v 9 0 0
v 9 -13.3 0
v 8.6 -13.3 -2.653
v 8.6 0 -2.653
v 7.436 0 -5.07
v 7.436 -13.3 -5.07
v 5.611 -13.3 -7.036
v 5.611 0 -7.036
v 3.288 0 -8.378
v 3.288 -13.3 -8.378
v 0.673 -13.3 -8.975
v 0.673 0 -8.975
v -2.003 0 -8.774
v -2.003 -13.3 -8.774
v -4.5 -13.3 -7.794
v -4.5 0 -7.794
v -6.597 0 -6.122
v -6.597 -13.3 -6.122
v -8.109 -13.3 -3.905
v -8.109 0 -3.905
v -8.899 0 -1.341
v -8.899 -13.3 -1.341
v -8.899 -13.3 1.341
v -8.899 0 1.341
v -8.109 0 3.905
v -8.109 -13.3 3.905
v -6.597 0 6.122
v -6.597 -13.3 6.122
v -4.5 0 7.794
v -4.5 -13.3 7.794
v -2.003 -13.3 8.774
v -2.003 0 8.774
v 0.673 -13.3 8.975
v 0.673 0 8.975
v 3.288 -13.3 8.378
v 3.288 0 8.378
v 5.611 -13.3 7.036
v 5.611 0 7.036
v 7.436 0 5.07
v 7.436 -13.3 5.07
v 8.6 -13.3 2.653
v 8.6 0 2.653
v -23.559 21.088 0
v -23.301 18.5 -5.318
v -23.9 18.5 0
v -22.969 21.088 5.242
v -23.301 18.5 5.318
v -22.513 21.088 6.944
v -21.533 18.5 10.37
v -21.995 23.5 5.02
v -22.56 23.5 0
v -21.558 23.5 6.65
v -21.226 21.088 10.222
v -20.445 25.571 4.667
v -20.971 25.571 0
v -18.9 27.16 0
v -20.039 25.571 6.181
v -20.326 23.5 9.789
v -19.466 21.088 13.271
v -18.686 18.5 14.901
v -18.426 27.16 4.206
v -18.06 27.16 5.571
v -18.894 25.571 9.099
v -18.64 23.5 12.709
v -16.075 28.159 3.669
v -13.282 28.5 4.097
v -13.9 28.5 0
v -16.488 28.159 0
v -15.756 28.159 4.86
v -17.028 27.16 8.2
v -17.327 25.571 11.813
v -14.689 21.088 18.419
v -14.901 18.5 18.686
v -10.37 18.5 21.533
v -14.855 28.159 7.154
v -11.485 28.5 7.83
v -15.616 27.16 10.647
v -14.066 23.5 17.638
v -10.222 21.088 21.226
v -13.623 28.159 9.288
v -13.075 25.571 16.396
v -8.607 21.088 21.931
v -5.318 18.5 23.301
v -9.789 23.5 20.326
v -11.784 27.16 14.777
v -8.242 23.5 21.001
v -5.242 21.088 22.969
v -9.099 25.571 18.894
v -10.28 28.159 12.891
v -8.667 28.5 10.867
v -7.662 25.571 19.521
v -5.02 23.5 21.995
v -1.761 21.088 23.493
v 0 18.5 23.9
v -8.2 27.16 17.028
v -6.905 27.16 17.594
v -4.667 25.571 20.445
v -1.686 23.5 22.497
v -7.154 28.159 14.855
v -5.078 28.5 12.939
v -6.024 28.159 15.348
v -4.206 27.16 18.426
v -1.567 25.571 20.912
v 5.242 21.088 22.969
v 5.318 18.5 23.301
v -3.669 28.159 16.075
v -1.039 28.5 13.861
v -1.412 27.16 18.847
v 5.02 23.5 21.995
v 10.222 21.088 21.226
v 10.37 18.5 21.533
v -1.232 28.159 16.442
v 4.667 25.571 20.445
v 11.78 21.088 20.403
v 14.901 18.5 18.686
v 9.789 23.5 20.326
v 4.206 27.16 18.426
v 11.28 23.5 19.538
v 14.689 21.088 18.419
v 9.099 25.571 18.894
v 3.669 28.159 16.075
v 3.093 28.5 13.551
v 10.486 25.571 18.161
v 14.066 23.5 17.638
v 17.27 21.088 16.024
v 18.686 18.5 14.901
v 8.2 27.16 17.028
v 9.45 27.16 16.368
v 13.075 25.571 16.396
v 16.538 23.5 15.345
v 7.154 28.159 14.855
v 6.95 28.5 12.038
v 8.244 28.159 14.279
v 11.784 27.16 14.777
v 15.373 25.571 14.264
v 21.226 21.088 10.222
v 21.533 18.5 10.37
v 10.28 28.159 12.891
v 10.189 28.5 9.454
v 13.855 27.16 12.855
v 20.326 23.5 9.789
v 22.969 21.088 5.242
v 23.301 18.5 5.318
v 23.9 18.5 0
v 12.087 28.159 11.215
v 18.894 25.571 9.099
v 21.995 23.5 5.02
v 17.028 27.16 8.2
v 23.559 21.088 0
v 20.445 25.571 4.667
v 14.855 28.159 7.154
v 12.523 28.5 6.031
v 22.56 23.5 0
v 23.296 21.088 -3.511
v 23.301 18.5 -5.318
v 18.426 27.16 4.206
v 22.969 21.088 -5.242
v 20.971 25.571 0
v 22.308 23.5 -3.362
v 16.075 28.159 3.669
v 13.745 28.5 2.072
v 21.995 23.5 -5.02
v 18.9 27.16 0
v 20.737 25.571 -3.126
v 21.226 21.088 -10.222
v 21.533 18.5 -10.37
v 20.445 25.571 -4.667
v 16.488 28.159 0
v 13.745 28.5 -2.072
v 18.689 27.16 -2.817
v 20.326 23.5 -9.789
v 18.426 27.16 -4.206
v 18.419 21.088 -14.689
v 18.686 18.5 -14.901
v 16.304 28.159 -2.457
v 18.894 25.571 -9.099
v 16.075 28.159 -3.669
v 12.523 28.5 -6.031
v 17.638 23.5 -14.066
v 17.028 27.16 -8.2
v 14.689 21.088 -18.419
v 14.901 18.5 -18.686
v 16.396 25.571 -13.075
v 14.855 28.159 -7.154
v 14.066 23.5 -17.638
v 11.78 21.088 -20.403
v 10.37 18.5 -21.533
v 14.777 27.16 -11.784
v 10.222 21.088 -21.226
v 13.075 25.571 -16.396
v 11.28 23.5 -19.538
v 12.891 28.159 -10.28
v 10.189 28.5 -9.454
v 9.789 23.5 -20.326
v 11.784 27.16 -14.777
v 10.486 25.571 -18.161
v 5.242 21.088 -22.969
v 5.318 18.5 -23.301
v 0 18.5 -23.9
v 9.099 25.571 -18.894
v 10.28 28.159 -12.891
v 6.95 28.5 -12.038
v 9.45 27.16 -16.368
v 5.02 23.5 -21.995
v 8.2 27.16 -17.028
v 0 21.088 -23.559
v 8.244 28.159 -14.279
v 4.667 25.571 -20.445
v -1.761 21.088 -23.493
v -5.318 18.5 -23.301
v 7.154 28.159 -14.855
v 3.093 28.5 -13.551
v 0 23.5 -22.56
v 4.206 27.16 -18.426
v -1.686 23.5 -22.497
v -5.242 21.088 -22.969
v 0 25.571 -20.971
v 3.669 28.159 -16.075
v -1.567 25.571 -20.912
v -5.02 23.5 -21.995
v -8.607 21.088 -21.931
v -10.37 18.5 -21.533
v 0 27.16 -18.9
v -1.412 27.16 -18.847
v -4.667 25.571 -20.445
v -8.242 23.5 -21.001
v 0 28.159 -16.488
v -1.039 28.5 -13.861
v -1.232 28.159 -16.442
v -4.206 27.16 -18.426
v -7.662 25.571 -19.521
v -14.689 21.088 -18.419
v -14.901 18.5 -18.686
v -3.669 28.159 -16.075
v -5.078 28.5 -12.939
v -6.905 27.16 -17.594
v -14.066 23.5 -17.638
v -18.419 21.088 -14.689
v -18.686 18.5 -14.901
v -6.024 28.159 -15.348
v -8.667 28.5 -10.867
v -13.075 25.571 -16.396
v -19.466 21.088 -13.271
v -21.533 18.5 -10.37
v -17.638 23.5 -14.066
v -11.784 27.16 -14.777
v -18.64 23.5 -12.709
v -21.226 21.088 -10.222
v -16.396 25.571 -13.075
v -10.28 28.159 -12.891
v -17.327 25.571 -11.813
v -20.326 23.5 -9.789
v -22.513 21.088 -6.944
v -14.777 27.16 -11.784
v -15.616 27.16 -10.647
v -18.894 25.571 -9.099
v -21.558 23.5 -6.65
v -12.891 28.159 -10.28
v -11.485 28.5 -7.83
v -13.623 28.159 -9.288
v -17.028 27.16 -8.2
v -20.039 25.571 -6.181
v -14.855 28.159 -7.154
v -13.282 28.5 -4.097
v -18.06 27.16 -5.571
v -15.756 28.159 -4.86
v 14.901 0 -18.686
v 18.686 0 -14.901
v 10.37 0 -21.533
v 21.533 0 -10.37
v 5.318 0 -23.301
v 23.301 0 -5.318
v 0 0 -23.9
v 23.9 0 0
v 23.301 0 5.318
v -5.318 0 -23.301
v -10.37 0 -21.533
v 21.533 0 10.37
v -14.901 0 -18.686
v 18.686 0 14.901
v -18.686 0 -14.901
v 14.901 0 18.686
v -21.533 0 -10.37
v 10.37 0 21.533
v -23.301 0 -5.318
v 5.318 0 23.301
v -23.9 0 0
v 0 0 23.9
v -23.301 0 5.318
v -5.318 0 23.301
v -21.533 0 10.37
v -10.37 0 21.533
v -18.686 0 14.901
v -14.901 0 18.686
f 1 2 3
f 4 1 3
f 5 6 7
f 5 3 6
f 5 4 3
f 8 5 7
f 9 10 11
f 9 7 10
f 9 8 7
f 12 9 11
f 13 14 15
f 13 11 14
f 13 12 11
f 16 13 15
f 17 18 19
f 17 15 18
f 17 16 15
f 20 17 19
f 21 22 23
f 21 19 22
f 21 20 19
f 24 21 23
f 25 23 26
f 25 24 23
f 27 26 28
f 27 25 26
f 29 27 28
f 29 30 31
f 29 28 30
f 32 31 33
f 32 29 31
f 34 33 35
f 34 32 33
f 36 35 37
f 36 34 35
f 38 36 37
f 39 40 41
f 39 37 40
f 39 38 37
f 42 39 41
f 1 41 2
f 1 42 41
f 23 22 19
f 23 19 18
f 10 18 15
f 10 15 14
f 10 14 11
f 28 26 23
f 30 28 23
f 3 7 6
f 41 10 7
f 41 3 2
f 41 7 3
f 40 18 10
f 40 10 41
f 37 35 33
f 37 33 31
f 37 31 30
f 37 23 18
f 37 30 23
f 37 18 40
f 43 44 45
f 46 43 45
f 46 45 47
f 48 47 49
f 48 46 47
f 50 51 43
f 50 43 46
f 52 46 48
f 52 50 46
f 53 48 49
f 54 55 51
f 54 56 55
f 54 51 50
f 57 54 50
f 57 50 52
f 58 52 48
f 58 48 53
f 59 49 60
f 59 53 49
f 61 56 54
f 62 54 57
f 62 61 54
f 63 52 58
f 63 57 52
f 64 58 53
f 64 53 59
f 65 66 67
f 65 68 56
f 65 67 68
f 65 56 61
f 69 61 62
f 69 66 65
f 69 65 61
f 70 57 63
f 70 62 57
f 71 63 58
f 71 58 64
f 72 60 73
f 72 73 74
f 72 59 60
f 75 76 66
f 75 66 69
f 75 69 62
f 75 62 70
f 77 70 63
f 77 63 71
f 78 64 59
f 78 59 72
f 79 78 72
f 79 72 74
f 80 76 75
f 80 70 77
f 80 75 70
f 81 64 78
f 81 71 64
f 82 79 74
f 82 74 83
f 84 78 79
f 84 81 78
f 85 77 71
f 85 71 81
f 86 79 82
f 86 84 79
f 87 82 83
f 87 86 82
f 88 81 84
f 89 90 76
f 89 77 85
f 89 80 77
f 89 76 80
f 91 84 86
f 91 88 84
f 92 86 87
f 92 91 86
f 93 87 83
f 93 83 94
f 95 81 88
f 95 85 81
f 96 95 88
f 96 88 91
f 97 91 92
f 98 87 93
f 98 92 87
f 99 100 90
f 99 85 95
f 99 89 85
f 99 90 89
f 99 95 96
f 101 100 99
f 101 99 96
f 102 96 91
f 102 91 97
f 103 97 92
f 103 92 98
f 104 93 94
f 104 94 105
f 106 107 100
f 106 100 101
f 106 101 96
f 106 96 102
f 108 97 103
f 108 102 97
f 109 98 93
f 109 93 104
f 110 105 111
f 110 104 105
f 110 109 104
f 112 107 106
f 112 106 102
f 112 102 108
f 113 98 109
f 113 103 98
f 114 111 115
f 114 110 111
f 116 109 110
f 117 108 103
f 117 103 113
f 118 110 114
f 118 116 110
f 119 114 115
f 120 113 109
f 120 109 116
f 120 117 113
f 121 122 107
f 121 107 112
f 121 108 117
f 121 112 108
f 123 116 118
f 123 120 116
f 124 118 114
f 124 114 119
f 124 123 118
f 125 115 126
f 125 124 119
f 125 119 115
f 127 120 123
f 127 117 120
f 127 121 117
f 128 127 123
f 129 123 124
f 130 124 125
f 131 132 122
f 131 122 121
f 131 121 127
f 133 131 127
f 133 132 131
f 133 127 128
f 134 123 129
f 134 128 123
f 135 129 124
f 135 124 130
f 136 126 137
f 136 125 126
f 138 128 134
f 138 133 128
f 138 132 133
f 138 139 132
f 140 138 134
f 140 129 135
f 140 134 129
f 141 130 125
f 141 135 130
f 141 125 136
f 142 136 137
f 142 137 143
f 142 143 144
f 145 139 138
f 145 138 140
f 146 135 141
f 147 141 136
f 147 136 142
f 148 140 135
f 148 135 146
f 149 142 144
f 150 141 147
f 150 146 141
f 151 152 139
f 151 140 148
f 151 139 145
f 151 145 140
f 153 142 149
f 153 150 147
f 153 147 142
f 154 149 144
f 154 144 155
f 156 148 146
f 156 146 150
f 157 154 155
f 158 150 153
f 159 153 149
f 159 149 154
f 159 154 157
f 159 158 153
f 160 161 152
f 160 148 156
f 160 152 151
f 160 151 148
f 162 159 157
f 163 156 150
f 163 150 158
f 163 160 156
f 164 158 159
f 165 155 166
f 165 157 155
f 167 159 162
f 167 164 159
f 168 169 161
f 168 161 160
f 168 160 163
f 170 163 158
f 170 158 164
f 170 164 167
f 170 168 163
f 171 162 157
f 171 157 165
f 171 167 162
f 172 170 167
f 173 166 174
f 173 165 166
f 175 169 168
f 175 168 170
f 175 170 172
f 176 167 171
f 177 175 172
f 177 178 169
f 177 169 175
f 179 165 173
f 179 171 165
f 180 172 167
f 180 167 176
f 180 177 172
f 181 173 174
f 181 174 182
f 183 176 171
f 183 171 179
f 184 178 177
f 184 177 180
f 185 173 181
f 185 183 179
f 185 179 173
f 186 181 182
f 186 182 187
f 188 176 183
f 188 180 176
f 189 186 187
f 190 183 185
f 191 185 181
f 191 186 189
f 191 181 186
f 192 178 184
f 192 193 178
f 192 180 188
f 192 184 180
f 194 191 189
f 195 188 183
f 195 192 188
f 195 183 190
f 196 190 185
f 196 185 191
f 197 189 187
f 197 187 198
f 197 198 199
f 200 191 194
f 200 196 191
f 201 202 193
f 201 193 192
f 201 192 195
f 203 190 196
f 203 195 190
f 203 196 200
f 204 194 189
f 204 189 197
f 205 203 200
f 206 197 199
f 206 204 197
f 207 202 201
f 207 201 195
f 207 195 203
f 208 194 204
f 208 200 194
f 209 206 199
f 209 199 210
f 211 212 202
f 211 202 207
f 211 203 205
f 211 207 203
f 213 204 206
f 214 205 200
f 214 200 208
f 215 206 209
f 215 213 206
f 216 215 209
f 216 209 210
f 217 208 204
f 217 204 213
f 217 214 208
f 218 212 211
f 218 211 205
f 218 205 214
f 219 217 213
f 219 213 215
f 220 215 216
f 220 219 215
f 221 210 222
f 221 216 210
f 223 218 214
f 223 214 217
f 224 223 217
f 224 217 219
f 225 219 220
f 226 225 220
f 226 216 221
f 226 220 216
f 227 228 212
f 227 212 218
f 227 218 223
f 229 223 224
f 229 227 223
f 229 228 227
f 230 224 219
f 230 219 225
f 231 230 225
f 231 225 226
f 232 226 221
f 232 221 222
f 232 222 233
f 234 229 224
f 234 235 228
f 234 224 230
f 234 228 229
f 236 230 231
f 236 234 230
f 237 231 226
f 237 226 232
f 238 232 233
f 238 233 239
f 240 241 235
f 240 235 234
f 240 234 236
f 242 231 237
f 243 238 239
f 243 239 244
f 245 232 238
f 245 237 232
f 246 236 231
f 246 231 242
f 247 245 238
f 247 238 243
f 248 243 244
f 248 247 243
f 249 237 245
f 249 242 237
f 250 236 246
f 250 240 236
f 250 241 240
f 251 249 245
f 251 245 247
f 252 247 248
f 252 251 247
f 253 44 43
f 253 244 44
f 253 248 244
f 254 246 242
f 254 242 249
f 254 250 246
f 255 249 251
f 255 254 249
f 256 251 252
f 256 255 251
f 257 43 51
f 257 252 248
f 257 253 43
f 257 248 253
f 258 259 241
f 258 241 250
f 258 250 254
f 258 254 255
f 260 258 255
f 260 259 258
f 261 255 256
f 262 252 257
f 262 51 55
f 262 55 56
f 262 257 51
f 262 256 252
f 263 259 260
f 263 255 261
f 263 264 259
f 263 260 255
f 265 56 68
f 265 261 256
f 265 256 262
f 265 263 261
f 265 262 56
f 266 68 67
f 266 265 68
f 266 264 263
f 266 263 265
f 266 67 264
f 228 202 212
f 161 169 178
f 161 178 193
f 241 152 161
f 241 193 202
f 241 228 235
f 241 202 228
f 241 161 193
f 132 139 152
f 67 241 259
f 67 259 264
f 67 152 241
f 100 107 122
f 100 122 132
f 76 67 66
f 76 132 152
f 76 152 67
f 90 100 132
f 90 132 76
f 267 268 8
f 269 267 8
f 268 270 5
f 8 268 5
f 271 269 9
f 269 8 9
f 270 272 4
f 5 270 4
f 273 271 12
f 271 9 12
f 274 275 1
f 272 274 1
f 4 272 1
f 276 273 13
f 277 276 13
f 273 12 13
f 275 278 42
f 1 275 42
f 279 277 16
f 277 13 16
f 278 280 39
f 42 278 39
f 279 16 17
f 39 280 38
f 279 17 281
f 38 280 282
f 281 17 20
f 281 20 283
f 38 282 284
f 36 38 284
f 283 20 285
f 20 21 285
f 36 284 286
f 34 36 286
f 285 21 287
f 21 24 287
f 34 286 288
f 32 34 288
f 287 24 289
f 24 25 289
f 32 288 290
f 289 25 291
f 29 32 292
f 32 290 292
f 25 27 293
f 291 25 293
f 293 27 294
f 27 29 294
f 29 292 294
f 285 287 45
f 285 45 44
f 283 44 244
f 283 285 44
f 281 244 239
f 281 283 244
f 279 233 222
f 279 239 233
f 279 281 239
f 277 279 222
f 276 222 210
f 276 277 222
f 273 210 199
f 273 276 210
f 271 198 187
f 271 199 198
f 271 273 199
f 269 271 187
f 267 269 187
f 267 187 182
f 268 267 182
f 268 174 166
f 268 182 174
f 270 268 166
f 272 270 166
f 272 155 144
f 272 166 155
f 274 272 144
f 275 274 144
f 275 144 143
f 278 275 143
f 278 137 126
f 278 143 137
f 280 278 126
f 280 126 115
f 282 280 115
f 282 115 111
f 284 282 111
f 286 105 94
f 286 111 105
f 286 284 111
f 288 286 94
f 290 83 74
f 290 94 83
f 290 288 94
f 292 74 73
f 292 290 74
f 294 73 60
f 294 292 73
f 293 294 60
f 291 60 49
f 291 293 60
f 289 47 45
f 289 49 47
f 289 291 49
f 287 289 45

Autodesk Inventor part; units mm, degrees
ref_plane "YZ Plane" through (0, 0, 0) normal (1, 0, 0) x (0, 1, 0)
ref_plane "XZ Plane" through (0, 0, 0) normal (0, 1, 0) x (-1, 0, 0)
ref_plane "XY Plane" through (0, 0, 0) normal (0, 0, 1) x (1, 0, 0)
sketch "Sketch1" plane through (0, 0, 0) normal (0, 1, 0) x (-1, 0, 0)
  circle A0 centre (0, 0) radius 23.9
  dimension "d0" = 47.8
extrude "Extrusion1" add sketch "Sketch1" along normal blind 28.5
fillet "Fillet1" radius 10 1 edges at (23.9, 28.5, 0)
sketch "Sketch2" plane through (0, 0, 0) normal (0, -1, 0) x (1, 0, 0)
  circle A0 centre (0, 0) radius 9
  dimension "d4" = 18
extrude "Extrusion2" add sketch "Sketch2" along normal blind 13.3
thread "Thread1" size "M18x2.5" class "6g" standard "ANSI Metric M Profile" full length
properties part number "G21.B.301111"
